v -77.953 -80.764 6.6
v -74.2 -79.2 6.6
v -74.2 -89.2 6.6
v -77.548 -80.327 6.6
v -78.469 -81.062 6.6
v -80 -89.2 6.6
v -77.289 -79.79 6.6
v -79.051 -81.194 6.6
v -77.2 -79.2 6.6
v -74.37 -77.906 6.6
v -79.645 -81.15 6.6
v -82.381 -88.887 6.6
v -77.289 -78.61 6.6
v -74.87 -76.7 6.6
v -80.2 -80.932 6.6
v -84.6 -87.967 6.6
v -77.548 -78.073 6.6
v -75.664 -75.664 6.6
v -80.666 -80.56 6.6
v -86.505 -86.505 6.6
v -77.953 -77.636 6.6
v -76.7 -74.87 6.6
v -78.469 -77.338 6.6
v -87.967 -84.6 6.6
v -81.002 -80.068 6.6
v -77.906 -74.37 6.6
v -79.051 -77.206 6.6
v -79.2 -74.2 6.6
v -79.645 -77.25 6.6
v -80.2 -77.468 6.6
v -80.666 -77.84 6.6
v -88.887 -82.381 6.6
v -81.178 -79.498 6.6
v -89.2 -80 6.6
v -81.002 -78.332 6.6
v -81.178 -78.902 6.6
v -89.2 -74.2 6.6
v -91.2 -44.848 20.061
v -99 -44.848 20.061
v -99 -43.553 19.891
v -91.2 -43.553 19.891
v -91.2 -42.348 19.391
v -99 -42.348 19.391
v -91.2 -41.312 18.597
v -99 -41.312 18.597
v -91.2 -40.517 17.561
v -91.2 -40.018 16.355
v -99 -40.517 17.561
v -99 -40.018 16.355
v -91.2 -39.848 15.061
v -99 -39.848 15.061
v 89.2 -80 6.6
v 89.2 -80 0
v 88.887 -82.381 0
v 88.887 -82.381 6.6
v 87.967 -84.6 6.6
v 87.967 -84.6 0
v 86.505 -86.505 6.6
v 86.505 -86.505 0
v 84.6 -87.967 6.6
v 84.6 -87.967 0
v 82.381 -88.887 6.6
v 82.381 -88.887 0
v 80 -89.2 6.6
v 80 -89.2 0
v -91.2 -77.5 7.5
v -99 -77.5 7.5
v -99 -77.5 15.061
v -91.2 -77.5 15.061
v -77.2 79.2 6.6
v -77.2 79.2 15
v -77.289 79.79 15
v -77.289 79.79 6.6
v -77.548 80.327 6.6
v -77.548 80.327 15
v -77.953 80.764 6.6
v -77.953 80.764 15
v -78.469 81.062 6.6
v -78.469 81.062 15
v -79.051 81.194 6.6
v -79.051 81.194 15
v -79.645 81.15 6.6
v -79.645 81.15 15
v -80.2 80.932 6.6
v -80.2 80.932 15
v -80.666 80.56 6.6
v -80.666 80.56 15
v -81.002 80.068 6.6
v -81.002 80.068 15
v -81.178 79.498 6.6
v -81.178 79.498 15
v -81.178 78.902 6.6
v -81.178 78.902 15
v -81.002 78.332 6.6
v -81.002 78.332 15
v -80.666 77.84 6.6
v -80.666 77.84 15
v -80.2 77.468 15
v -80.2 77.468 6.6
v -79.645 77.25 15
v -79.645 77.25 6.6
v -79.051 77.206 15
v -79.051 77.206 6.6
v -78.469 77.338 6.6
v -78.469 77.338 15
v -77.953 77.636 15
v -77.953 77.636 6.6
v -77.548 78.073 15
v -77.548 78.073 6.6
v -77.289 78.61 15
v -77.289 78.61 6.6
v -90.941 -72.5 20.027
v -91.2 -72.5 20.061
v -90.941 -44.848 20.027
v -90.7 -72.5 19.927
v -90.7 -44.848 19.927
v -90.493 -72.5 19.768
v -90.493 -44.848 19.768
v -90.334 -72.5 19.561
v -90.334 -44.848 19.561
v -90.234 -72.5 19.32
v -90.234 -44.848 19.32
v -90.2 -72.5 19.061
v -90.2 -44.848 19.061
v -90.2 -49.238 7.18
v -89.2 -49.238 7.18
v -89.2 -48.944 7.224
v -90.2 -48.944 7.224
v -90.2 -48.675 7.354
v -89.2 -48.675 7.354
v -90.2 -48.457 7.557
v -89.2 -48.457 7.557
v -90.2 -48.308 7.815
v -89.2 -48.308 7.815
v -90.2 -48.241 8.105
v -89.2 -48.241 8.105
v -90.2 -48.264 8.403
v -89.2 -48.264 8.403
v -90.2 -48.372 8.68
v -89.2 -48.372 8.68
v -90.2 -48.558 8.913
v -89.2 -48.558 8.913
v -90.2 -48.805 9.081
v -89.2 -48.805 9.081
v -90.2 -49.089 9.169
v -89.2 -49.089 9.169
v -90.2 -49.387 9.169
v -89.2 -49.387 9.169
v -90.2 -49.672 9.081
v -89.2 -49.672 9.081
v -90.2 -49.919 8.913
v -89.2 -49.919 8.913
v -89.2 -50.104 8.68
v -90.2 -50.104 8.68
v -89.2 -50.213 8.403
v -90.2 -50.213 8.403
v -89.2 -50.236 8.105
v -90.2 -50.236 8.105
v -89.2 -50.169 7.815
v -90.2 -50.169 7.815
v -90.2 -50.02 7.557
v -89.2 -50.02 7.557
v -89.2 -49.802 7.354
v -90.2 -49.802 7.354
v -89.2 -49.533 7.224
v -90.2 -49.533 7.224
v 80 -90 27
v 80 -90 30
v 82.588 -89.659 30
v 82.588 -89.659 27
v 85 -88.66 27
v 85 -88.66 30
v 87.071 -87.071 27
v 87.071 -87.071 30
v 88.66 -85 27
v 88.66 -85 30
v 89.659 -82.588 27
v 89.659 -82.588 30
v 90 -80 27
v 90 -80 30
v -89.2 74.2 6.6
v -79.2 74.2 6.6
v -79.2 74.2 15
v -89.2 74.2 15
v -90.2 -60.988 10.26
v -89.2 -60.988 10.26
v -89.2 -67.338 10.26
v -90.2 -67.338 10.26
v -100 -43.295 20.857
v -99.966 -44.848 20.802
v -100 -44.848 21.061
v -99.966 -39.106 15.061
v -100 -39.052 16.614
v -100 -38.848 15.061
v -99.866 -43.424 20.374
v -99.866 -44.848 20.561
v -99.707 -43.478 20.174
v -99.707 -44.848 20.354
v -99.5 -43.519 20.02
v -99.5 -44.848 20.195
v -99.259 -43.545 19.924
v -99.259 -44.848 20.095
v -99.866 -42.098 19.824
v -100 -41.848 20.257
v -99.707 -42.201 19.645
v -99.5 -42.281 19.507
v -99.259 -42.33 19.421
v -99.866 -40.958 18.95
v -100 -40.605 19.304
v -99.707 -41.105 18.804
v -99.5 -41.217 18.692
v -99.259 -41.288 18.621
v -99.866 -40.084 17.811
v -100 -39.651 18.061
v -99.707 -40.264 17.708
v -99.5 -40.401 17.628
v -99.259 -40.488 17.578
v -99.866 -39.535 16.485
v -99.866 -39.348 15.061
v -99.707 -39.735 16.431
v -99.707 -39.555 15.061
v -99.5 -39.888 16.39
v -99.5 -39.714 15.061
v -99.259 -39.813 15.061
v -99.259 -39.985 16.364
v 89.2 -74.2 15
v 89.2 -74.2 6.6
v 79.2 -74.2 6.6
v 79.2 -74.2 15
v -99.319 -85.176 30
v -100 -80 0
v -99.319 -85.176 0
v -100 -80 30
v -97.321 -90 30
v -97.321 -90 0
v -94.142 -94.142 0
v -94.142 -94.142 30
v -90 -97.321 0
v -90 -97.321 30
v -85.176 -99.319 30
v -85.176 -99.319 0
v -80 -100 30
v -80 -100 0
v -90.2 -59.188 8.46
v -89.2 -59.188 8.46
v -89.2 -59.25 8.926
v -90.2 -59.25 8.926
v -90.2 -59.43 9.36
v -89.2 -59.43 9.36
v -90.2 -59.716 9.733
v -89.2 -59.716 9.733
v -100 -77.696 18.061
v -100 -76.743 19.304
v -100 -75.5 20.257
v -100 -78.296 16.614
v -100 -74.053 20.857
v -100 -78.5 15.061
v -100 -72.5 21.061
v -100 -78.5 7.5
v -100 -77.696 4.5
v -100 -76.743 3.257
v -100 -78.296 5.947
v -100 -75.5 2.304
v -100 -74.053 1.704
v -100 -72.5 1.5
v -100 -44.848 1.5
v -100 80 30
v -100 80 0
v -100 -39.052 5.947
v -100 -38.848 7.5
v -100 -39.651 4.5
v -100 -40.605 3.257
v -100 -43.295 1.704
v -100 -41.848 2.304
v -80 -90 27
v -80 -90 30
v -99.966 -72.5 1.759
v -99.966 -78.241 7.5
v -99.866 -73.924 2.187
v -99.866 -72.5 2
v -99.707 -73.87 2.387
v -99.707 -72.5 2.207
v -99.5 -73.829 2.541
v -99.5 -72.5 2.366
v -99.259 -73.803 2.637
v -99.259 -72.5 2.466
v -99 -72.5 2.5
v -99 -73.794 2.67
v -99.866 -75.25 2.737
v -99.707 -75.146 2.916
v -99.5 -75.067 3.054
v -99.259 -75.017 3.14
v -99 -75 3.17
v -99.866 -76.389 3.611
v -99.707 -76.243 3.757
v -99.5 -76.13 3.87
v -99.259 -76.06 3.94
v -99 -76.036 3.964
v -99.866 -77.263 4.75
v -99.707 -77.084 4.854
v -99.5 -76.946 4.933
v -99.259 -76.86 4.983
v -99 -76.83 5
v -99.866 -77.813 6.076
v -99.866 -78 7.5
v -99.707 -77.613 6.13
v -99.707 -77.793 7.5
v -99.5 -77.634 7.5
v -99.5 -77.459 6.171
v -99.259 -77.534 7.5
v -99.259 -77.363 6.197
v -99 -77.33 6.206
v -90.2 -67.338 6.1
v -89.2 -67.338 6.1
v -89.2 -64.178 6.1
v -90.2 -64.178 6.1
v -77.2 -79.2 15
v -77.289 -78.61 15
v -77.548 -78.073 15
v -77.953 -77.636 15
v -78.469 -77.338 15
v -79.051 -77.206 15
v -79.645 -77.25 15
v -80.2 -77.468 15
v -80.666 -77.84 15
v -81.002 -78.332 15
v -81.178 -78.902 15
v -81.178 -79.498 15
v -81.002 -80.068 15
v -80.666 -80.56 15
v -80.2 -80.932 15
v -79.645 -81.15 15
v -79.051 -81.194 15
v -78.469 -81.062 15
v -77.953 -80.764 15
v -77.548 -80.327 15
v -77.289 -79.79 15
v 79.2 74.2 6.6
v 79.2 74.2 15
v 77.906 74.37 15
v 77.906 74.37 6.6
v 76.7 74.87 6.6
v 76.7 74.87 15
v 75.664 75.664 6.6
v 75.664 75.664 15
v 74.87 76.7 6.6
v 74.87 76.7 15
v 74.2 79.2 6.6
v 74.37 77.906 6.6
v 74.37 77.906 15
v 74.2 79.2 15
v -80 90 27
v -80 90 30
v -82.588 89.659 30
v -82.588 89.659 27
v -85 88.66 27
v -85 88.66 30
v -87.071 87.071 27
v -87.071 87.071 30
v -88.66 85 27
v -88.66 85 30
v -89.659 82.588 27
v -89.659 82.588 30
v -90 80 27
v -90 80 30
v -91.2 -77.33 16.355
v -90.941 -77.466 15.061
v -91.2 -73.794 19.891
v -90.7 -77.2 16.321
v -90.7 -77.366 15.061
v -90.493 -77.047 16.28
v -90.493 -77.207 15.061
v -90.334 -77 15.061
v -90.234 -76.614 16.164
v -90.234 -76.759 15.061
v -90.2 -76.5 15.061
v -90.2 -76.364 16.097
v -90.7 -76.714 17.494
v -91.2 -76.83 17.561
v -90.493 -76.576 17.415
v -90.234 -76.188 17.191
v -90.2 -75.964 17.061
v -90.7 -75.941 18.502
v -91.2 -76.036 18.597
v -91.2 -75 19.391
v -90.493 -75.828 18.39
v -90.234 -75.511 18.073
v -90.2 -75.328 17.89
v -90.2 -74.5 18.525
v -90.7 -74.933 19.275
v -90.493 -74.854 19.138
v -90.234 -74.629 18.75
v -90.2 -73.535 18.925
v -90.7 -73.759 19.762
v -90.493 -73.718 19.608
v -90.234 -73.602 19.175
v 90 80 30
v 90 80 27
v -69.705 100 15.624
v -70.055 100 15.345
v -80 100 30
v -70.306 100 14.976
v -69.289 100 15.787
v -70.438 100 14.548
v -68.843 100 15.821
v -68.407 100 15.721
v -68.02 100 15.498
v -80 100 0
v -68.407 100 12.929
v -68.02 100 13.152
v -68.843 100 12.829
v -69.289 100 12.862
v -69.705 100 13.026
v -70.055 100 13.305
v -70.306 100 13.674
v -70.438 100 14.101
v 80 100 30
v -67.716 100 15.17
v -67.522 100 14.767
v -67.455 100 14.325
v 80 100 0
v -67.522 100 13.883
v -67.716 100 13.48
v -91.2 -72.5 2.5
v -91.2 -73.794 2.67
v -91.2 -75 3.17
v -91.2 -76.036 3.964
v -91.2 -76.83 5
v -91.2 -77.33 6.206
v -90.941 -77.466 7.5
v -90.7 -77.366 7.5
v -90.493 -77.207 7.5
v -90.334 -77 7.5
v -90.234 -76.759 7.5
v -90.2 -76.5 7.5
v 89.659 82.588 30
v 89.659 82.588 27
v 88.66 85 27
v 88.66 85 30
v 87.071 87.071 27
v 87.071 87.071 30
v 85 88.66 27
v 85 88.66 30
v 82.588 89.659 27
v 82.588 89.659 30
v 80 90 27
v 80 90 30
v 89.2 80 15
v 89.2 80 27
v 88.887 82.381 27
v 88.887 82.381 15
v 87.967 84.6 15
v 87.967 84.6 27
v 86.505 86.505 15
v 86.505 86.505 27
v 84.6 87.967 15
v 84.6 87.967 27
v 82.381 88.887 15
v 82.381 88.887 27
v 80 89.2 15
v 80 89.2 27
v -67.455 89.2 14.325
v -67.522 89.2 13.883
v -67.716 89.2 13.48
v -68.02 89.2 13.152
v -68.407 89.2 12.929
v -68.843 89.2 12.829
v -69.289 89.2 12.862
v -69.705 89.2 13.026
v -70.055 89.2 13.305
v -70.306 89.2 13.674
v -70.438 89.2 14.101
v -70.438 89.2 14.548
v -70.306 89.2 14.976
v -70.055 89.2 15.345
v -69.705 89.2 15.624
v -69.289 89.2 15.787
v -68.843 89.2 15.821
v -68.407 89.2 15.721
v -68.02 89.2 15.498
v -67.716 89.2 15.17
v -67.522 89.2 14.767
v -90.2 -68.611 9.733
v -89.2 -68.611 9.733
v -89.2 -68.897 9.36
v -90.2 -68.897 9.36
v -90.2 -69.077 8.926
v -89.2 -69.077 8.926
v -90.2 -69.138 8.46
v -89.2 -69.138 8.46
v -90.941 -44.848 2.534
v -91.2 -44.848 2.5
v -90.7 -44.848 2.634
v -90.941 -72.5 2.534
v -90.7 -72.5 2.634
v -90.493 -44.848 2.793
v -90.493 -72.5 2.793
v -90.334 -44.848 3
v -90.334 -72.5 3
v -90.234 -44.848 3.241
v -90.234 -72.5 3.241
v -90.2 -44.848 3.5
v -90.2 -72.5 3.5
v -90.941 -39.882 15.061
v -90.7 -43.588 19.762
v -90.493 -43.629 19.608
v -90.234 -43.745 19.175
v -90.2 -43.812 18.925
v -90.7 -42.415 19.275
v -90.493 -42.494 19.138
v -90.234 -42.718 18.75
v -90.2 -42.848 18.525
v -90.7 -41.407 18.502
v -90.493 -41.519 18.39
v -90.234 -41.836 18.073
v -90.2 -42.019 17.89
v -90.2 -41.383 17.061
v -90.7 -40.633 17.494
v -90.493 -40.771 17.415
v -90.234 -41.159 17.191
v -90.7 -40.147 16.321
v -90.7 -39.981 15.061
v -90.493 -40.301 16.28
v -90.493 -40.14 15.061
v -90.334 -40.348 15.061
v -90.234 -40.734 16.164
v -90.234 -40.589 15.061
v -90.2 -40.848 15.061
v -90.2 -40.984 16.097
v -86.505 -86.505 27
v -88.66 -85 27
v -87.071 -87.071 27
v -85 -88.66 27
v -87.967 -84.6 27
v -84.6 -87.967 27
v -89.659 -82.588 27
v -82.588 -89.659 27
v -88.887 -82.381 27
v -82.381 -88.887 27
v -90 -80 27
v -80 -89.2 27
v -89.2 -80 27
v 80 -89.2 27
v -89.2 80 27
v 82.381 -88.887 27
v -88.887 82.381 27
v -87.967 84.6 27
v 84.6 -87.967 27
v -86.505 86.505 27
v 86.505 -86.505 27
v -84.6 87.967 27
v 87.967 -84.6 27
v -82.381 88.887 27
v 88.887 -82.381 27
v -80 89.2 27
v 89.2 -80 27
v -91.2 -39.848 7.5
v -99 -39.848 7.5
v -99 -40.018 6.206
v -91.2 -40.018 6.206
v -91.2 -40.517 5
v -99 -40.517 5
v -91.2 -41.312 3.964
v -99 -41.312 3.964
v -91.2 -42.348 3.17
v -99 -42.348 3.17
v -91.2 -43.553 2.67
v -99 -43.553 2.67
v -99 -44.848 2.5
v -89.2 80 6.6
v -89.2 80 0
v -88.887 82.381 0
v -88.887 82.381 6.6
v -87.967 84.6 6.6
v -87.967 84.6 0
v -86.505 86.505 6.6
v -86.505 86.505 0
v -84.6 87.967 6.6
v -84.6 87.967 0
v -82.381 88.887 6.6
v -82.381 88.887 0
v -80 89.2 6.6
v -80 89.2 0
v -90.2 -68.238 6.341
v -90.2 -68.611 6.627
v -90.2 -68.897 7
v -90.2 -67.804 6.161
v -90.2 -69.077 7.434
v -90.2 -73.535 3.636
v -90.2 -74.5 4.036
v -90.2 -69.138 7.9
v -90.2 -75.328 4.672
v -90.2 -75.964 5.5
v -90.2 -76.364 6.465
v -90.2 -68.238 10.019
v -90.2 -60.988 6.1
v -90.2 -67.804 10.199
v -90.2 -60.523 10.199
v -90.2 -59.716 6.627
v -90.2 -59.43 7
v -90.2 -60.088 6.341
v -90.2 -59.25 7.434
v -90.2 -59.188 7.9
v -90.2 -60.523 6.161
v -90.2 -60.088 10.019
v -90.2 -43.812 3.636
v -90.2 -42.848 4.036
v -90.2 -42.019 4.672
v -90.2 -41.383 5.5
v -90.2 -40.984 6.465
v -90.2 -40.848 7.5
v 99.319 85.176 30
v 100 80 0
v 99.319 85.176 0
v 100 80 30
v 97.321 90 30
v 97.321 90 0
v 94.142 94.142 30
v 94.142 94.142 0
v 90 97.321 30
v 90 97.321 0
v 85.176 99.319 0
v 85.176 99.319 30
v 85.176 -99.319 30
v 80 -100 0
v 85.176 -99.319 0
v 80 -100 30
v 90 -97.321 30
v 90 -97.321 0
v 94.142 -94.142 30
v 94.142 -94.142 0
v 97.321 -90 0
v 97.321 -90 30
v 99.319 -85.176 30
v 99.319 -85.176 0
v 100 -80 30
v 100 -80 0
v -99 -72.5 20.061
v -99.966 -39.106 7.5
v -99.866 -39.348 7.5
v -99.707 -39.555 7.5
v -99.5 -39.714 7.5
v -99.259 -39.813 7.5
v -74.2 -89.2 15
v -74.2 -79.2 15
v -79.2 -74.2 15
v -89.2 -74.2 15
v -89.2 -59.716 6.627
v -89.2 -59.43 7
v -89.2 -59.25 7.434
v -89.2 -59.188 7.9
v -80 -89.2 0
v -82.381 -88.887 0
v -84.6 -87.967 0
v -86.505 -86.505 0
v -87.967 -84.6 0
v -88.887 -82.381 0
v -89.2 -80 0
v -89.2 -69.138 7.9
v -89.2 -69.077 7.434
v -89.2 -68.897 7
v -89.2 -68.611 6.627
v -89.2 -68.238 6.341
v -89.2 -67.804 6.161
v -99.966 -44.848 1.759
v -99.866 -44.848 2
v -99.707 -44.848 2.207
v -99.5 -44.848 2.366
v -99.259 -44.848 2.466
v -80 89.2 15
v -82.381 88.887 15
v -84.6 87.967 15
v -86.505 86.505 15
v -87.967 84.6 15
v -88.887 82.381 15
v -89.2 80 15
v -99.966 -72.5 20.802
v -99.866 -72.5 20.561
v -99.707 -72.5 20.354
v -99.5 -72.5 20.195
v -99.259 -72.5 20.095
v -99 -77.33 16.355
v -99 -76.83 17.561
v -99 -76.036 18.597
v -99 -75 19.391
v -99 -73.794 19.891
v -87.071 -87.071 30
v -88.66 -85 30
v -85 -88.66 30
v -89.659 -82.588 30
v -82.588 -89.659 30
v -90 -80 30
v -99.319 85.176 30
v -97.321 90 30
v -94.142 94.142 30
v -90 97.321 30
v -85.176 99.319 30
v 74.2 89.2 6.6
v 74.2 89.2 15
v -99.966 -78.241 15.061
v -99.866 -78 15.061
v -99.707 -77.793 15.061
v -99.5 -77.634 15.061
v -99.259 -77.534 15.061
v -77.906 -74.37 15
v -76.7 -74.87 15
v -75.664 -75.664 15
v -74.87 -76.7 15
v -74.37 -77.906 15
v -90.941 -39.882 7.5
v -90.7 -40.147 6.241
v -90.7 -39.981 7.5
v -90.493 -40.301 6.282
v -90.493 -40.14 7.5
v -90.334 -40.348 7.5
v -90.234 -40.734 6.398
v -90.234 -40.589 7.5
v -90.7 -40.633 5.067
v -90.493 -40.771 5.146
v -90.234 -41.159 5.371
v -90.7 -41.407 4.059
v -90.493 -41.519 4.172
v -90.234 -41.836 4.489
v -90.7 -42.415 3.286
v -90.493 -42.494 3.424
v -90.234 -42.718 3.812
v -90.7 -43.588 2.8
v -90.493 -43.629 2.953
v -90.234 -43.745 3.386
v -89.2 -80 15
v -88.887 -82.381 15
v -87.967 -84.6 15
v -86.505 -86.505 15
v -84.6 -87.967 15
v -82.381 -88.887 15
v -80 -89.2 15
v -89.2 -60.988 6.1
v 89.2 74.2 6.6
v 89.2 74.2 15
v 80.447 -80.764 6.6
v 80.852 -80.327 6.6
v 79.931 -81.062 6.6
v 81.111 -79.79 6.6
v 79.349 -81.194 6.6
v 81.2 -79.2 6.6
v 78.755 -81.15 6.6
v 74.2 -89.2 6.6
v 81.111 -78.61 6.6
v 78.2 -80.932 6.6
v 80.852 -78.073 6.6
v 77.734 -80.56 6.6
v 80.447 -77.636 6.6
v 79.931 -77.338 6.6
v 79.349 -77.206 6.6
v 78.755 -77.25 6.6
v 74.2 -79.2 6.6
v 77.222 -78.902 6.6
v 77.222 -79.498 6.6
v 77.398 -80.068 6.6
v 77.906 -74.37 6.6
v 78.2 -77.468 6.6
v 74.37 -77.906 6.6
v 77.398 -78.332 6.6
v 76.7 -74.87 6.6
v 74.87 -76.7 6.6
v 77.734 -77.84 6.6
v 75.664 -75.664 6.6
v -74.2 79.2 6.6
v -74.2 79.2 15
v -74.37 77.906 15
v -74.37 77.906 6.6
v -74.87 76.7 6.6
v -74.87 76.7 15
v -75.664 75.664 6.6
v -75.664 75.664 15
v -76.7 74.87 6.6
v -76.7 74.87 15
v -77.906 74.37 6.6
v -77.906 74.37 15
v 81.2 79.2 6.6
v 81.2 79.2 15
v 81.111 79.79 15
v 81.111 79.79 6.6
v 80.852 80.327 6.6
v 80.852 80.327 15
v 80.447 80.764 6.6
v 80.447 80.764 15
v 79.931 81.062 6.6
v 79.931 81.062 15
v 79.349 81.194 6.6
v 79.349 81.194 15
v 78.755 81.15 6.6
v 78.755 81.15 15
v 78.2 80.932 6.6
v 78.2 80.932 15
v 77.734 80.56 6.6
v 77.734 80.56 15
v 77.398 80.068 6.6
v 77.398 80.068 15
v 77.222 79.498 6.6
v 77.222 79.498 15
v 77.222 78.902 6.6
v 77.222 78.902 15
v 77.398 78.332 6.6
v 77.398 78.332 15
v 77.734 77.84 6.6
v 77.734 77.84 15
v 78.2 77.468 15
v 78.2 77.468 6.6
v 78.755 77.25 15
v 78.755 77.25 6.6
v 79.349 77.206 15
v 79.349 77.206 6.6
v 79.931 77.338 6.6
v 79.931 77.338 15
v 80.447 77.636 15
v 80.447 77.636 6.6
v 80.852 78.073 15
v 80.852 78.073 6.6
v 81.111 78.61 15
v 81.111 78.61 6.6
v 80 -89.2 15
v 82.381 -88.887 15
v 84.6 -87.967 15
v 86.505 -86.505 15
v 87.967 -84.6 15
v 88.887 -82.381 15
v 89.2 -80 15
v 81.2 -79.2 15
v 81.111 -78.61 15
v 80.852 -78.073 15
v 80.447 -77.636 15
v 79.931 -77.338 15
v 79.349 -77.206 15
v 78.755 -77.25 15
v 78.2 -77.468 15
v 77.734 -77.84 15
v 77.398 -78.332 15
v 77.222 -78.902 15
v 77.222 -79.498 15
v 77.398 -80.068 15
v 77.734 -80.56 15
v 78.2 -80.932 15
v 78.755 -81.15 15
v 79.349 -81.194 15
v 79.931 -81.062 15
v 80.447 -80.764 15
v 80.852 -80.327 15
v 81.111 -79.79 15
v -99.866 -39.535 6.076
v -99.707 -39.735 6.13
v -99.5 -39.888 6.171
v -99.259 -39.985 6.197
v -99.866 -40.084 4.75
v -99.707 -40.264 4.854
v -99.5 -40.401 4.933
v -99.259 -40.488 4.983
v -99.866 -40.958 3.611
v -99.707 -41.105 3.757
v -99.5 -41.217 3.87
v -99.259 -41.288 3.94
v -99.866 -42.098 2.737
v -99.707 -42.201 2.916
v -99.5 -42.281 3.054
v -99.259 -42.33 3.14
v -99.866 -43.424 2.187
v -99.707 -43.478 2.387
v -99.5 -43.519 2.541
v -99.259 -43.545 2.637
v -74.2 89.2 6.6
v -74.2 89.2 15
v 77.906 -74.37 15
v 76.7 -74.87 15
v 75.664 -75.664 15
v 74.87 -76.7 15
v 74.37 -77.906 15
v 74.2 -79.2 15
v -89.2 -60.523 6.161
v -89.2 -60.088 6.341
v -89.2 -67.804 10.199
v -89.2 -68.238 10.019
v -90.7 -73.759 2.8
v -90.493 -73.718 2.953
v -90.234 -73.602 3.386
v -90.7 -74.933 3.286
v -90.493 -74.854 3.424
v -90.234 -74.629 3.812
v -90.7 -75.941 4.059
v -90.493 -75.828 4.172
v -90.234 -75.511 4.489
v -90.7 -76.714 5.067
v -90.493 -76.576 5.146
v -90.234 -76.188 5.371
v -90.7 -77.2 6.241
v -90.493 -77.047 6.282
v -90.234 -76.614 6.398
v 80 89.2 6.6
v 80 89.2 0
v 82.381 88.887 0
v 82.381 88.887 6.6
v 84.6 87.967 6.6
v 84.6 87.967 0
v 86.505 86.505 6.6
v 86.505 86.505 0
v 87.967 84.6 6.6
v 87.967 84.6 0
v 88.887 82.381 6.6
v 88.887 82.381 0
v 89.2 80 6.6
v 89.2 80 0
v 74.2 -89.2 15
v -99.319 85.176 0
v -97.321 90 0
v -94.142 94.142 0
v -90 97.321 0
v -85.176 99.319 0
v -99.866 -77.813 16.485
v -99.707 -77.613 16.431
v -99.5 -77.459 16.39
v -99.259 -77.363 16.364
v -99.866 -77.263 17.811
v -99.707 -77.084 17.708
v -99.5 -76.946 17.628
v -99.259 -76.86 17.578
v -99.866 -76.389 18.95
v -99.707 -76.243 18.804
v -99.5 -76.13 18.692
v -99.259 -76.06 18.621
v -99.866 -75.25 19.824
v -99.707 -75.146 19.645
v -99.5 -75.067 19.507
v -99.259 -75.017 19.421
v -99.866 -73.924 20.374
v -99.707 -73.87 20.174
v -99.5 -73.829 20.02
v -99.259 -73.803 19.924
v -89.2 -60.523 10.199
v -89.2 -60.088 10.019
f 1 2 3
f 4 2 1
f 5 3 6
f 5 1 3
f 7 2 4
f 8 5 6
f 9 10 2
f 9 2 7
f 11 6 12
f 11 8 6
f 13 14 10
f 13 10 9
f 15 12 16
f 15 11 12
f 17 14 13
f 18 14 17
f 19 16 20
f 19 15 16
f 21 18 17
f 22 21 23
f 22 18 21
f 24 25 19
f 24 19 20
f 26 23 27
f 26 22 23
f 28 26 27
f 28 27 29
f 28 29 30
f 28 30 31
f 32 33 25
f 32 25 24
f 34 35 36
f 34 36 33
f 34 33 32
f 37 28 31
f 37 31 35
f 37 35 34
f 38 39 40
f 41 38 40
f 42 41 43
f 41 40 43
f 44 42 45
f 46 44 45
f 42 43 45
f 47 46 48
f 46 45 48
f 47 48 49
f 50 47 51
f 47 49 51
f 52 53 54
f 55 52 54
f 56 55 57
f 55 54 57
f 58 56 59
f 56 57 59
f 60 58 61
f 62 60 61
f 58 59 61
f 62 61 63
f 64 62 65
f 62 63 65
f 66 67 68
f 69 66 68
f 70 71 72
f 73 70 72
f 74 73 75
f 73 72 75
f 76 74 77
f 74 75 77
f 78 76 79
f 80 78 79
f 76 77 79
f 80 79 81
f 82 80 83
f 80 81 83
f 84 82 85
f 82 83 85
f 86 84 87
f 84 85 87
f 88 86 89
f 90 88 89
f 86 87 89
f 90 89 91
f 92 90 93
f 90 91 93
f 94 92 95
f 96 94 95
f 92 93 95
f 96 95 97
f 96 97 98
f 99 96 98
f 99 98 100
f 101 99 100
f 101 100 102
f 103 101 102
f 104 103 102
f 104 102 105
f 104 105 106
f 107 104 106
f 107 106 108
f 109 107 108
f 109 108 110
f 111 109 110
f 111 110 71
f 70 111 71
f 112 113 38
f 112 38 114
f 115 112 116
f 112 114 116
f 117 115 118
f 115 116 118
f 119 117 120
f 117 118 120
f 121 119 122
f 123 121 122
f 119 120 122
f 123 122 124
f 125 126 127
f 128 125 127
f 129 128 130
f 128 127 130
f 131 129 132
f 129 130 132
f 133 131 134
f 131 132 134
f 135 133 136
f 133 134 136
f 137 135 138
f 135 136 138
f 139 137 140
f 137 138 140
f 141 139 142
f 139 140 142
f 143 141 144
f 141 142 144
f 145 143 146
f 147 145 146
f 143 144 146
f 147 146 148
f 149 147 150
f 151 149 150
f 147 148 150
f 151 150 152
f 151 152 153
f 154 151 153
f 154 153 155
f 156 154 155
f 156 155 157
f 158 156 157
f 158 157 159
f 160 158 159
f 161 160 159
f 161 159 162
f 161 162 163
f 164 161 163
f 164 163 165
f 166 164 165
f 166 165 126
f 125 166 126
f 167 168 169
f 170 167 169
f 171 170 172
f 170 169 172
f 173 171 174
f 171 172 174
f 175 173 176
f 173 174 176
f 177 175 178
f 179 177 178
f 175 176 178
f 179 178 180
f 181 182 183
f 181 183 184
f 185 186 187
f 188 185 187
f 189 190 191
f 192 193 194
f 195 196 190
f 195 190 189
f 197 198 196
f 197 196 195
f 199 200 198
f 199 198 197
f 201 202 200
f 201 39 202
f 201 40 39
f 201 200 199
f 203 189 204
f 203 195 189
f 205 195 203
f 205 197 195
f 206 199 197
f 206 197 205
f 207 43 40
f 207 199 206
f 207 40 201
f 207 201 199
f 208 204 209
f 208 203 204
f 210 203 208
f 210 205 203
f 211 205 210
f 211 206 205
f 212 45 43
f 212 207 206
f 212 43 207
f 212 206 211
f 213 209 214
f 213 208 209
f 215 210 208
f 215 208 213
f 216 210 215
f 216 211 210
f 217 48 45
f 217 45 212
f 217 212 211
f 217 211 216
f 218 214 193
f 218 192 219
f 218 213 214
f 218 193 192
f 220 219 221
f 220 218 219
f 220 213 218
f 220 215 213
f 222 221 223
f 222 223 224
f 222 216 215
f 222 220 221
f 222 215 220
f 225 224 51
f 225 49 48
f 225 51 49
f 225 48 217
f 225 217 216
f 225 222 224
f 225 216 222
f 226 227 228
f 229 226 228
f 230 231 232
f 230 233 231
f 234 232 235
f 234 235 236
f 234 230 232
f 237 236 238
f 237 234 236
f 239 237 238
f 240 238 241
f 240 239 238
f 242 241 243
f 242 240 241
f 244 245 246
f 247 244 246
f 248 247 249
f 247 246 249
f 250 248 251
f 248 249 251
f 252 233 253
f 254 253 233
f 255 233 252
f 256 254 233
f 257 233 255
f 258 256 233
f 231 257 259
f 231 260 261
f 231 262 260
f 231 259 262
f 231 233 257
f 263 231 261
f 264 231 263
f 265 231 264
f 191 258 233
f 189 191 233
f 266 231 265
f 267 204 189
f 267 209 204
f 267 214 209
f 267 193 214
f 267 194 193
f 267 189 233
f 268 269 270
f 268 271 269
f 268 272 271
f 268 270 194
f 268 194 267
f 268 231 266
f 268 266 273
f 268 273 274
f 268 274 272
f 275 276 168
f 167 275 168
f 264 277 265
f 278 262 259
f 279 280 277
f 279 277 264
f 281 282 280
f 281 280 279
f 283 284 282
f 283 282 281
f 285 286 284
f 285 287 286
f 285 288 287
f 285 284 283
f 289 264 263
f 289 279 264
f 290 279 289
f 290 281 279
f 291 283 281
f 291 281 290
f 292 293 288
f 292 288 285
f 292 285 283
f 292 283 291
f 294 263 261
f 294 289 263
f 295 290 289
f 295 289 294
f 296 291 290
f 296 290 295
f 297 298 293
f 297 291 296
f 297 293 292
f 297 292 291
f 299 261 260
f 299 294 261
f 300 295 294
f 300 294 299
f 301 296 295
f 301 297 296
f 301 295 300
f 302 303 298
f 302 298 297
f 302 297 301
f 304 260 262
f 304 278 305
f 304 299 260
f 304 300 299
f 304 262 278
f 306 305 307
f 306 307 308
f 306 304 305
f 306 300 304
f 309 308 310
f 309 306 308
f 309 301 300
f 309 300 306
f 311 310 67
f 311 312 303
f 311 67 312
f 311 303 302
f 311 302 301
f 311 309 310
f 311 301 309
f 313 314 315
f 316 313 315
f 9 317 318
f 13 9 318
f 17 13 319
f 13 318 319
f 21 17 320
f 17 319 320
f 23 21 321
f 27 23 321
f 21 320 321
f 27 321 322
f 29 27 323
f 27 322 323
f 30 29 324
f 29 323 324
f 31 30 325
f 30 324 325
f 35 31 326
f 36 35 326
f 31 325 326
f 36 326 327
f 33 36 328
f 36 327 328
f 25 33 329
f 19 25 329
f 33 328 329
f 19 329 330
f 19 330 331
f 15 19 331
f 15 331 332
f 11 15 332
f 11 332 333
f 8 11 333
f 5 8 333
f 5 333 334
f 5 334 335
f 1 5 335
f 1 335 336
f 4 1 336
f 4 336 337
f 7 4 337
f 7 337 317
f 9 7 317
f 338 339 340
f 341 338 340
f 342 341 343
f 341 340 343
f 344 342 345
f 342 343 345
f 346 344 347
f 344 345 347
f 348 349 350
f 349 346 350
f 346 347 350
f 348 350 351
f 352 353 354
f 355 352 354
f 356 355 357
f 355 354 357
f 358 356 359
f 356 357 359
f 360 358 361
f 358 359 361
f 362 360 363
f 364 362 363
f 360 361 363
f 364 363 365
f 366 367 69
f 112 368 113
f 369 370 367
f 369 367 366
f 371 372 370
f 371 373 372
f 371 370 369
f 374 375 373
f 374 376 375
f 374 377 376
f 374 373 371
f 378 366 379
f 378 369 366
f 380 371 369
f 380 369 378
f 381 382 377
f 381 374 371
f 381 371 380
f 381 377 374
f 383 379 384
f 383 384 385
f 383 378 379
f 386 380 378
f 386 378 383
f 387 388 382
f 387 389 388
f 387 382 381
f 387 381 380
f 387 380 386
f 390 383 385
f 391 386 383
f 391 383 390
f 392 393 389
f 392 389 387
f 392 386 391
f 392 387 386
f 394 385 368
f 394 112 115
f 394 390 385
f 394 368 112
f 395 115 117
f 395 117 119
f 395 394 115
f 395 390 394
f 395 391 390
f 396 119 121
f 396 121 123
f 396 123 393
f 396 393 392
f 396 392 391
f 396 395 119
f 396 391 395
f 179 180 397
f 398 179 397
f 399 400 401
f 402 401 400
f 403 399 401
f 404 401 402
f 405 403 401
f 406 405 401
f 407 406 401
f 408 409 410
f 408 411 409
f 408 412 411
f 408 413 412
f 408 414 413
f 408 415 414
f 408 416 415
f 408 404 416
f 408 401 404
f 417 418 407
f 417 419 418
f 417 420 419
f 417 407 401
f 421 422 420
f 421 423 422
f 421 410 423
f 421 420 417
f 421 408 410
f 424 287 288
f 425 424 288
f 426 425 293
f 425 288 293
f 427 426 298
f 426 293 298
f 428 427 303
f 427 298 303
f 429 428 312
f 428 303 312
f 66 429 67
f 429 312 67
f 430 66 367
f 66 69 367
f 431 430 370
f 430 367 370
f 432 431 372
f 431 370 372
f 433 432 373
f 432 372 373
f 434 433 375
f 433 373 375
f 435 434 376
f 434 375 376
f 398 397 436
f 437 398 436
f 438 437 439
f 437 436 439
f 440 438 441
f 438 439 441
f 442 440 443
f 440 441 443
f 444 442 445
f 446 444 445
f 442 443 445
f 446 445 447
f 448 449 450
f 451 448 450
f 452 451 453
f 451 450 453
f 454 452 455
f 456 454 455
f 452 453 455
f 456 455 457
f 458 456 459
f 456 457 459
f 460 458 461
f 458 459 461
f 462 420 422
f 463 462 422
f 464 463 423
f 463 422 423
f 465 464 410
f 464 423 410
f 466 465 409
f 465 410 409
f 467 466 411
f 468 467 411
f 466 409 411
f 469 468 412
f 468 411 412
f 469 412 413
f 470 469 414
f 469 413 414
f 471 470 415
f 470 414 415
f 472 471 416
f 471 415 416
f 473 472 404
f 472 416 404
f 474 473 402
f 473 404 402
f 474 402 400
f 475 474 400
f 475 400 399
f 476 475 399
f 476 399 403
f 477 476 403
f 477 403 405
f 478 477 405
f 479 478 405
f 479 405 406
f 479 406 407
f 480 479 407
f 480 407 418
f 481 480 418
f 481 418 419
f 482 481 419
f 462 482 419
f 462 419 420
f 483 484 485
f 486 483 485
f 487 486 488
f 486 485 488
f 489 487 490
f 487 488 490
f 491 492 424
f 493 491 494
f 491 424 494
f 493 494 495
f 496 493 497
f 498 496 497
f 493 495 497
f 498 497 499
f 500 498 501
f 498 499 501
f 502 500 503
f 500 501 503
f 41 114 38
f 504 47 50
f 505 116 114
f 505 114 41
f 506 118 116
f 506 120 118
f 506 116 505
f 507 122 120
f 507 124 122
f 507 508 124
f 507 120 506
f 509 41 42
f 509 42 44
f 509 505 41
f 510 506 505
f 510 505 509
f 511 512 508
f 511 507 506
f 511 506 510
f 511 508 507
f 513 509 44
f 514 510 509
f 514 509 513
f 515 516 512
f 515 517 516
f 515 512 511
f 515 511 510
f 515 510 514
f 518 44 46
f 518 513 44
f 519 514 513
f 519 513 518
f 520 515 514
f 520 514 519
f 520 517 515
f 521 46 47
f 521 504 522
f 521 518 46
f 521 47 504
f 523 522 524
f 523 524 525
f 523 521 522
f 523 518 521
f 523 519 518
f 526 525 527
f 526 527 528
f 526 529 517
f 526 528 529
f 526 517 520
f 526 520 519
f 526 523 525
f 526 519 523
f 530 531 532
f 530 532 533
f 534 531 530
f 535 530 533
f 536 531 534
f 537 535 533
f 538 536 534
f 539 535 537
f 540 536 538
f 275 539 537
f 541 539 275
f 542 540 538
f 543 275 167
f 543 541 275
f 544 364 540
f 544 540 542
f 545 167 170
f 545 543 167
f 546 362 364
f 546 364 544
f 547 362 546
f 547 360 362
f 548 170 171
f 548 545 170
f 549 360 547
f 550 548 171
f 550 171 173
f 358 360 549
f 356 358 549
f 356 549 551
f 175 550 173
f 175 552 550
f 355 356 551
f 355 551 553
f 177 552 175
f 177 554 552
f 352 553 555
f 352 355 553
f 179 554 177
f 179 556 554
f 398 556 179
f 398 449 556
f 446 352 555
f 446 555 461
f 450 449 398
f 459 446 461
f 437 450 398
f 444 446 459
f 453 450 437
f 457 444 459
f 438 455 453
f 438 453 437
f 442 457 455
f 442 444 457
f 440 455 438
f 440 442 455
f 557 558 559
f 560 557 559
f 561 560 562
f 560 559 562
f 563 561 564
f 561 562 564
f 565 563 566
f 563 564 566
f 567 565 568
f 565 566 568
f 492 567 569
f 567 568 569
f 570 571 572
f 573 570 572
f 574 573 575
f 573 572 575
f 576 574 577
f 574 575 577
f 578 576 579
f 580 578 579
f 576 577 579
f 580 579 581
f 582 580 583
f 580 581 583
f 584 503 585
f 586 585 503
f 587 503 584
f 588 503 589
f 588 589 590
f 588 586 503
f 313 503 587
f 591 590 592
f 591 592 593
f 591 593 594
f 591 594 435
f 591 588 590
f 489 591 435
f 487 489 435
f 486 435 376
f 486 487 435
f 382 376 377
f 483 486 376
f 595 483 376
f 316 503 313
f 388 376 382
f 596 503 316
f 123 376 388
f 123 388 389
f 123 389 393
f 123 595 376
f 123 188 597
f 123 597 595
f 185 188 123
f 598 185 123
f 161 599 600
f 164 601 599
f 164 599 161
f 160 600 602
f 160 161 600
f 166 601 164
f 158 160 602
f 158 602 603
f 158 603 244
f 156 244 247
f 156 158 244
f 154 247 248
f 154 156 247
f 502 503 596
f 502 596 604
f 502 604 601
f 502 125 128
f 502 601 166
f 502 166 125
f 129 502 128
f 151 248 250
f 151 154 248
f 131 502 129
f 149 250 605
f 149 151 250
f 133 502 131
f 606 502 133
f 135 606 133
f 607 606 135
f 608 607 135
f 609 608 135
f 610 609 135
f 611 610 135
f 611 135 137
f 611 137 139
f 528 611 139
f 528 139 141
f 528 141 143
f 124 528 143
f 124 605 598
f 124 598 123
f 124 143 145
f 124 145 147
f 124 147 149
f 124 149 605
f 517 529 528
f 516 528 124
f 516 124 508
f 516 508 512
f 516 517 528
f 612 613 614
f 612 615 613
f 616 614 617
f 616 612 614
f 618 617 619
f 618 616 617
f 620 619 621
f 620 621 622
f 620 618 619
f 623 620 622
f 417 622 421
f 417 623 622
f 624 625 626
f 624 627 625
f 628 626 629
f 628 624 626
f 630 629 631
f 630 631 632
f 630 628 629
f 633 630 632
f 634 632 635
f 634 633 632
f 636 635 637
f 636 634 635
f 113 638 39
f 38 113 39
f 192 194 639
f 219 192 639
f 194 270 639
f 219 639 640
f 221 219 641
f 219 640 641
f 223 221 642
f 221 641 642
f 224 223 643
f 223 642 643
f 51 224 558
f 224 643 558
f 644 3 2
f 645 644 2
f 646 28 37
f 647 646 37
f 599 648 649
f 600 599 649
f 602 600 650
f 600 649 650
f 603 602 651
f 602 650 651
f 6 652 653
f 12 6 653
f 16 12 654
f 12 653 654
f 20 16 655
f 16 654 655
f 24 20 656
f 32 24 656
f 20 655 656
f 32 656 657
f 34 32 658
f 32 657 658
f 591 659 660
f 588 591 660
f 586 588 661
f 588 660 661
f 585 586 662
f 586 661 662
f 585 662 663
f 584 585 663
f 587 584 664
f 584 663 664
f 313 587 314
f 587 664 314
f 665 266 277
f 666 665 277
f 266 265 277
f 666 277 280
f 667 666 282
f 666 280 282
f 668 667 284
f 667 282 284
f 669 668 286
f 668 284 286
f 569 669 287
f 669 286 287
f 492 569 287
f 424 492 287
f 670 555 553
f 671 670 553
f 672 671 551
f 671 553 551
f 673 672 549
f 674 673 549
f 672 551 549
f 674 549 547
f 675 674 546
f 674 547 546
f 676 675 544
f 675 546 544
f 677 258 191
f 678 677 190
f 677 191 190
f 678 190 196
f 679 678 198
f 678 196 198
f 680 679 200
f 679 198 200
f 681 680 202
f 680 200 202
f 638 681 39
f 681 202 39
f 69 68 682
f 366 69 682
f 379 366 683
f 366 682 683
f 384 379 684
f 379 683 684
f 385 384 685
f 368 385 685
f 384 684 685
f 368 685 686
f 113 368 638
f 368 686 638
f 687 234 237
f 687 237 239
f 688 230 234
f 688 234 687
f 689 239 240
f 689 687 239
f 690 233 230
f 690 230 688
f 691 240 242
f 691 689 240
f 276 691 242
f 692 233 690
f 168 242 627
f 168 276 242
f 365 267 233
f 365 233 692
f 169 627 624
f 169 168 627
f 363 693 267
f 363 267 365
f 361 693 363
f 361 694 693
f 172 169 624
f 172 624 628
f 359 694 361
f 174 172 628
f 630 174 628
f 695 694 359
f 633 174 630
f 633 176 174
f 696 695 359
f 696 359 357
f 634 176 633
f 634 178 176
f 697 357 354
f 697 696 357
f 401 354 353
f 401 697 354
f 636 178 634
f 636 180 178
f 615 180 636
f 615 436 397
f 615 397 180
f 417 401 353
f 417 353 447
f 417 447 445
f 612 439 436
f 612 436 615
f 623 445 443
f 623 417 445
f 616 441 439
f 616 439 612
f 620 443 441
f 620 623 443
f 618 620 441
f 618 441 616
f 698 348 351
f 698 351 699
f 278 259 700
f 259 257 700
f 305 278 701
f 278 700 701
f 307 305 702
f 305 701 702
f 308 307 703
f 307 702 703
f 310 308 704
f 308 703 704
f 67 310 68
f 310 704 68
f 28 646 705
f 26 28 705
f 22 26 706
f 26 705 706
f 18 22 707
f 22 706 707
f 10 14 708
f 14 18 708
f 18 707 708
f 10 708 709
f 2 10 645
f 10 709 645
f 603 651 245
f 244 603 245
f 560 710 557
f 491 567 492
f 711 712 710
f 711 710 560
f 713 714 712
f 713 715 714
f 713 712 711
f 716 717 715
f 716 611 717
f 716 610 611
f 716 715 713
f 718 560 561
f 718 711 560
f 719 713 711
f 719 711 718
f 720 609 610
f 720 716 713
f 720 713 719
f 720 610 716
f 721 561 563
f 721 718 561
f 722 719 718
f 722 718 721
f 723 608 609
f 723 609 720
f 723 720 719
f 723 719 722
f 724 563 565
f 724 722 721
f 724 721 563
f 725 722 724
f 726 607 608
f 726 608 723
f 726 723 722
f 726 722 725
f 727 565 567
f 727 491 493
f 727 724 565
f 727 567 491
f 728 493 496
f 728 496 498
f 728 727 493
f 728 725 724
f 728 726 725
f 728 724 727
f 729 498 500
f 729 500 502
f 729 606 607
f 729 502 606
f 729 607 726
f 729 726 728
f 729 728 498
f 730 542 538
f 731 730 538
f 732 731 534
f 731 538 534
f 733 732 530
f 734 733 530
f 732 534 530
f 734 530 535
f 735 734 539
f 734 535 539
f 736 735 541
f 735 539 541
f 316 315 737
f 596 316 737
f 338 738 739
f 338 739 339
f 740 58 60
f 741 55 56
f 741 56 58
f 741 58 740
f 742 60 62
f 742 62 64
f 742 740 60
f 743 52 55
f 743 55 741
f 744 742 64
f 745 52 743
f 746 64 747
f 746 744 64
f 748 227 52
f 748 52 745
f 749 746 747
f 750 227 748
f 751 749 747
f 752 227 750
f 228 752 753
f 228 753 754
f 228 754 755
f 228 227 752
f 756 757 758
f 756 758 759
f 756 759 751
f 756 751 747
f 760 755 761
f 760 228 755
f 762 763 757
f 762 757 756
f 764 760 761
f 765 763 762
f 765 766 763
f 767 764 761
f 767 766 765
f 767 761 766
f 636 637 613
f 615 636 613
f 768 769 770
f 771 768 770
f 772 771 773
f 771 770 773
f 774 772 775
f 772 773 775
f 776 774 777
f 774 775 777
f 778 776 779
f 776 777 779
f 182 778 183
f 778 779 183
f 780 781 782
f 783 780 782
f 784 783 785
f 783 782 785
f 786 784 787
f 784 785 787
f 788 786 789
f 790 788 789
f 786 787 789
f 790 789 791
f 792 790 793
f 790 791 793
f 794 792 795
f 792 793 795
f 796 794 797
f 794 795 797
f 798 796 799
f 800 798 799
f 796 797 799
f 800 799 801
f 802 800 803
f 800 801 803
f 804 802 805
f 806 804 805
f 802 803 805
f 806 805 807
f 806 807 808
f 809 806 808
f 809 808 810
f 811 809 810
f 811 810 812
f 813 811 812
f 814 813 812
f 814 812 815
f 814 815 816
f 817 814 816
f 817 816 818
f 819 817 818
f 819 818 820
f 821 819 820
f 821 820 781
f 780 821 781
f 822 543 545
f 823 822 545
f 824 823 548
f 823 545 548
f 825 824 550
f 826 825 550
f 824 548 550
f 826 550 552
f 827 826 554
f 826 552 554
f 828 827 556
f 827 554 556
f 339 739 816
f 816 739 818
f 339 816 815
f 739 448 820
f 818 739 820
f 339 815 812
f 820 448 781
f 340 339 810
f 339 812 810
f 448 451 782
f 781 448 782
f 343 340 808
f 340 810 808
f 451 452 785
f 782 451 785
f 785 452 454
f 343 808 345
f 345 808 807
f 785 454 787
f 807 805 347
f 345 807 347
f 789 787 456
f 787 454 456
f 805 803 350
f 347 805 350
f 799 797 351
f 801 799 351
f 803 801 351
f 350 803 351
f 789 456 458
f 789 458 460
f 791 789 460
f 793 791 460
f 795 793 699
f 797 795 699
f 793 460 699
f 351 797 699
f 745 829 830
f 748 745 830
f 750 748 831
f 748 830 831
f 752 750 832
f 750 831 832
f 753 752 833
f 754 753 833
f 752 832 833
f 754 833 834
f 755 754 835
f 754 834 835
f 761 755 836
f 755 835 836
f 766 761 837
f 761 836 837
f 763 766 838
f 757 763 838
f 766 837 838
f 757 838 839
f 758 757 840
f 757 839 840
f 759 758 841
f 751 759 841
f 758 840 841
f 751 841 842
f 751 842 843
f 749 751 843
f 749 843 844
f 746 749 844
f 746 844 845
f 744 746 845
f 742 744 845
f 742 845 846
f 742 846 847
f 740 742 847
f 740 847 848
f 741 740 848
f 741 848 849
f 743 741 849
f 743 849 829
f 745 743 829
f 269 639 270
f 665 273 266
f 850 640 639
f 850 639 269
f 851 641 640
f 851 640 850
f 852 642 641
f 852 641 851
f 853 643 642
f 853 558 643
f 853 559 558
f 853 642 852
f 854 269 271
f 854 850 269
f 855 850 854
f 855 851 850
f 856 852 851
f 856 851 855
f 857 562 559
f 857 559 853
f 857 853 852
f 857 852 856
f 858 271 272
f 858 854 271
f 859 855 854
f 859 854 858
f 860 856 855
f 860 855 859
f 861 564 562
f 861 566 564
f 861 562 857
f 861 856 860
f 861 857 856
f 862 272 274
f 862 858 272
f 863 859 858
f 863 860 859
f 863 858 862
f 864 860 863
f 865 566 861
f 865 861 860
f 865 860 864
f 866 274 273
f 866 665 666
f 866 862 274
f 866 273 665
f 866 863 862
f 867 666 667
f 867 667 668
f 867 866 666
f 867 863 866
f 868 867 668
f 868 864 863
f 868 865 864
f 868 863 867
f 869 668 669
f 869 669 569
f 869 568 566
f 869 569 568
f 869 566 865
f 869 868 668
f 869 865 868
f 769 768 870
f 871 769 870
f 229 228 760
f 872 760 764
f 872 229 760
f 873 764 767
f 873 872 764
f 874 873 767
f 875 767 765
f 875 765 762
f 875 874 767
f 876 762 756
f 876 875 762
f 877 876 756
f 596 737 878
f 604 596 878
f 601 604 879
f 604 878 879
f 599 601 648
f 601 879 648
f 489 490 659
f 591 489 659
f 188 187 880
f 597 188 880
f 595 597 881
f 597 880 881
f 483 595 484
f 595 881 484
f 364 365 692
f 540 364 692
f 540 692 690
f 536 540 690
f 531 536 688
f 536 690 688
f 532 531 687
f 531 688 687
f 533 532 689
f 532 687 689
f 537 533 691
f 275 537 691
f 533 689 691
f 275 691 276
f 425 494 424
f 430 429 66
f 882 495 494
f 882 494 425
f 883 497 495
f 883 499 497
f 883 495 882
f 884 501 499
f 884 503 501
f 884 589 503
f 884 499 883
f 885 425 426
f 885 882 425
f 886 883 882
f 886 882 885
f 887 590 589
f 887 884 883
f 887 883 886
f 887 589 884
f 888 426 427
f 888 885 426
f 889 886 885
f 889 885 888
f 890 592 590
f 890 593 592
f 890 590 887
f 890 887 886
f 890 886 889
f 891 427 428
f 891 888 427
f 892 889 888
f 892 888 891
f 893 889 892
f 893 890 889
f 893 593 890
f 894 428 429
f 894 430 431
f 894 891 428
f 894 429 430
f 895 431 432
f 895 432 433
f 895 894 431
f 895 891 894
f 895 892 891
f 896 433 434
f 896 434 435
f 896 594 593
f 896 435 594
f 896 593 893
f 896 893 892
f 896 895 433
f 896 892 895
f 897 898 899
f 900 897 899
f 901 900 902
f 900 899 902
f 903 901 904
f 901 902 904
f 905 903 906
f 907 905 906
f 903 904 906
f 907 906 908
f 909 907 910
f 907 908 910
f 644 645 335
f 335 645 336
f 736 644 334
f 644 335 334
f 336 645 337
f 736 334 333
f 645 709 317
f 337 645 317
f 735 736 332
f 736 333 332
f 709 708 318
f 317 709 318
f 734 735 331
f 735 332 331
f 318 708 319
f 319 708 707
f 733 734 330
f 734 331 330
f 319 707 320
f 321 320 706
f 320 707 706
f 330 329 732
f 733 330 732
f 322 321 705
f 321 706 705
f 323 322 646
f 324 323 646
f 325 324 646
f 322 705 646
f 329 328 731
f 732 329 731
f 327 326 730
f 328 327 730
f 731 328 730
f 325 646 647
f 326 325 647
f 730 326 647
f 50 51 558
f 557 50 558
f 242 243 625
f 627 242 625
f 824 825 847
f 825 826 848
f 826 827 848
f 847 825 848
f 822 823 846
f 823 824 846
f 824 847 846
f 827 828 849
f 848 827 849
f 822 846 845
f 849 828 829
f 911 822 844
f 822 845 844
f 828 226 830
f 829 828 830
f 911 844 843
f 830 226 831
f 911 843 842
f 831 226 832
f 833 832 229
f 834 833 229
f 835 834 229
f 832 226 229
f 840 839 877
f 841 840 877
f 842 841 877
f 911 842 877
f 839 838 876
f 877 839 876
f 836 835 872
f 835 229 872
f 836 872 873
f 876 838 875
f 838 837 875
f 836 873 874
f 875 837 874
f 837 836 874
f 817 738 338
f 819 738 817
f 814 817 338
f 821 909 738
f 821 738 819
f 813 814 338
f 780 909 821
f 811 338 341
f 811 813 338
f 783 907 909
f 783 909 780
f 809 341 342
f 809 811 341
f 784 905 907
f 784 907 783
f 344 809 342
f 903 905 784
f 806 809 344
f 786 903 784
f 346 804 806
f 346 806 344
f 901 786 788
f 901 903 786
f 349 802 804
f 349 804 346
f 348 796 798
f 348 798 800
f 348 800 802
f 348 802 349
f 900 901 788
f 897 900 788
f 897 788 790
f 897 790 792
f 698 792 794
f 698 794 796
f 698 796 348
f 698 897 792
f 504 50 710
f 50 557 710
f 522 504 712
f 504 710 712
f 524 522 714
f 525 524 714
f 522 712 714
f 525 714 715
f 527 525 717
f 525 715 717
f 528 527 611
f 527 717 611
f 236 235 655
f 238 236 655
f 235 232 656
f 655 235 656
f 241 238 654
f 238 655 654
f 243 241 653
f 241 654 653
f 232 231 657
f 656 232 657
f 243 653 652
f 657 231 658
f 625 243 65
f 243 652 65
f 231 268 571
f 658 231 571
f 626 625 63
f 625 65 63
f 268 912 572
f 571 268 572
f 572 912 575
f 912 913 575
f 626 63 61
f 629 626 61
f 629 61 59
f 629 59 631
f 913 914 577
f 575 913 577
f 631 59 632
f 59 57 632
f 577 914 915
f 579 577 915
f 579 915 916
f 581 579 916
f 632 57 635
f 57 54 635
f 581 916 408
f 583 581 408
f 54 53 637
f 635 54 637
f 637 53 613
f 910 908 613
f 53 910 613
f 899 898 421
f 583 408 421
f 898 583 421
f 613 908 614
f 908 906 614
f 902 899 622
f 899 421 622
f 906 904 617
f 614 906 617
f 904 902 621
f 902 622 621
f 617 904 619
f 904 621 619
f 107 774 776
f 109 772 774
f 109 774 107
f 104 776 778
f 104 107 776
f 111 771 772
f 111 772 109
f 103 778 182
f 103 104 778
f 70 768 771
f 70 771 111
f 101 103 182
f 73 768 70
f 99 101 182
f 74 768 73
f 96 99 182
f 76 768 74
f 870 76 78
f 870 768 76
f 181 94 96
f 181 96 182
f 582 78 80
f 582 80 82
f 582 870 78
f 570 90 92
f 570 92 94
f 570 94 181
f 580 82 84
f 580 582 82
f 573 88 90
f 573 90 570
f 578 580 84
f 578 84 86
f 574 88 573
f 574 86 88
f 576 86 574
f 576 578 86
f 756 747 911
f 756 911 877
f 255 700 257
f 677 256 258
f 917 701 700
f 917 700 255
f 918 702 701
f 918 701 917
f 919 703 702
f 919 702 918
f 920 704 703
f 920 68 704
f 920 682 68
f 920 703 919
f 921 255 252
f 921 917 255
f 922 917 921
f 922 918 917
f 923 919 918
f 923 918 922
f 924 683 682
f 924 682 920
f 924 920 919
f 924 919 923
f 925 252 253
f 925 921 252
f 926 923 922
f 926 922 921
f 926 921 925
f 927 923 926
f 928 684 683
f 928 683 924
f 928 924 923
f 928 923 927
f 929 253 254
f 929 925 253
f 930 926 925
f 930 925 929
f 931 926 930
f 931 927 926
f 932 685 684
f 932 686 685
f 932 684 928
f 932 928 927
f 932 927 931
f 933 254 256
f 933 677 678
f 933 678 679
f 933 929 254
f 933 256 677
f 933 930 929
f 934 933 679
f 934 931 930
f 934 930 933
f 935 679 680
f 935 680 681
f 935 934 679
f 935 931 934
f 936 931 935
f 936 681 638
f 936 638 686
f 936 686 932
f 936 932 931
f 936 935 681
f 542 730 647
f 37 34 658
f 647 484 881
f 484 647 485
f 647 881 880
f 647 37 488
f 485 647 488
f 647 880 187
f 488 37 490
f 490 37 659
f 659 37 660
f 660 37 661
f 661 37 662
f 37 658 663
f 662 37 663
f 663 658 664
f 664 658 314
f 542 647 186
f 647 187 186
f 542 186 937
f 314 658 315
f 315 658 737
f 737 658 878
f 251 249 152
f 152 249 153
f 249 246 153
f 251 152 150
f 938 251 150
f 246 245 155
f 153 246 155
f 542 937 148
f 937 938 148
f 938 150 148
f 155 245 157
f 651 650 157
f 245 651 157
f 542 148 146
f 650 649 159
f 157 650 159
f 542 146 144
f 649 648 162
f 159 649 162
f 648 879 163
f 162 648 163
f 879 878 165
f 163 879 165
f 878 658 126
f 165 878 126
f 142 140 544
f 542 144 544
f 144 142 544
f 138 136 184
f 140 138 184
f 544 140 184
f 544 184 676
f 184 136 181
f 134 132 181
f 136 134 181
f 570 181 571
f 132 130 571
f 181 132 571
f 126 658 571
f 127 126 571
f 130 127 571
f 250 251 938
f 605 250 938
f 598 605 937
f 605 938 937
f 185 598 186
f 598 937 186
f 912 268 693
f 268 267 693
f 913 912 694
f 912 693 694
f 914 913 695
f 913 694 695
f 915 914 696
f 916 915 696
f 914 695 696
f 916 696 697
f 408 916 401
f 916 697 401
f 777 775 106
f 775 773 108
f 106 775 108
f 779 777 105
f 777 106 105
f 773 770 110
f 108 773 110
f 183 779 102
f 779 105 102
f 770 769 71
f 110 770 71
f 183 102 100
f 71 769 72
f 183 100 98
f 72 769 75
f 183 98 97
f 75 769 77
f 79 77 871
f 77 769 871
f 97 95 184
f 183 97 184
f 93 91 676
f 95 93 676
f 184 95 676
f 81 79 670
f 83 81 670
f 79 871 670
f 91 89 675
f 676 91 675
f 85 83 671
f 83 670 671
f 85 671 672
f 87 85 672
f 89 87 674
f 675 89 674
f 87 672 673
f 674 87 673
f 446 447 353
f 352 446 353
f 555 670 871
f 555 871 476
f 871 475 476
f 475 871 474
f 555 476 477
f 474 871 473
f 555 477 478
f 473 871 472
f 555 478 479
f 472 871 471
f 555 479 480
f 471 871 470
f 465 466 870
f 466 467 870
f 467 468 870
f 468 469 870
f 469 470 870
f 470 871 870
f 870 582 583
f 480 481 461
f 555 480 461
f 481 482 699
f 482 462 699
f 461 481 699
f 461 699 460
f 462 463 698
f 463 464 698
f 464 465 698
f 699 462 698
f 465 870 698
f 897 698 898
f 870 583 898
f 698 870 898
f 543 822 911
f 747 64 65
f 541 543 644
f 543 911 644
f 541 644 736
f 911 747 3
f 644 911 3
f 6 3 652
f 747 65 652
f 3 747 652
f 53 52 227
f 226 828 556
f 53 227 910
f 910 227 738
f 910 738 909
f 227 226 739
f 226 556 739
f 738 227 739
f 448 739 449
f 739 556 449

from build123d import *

# Parameters (mm, degrees)
SKETCH2_W                = 200
SKETCH2_H                = 200
BOSS_EXTRUDE1_DEPTH      = 30
FILLET1_R                = 20
CUT_EXTRUDE1_DEPTH       = 3
CUT_EXTRUDE2_DEPTH       = 28
SKETCH6_W                = 15
SKETCH6_H                = 15
BOSS_EXTRUDE4_DEPTH      = 15
FILLET2_R                = 5
F_4_0_4_DIAMETER_HOLE1_D = 4
CUT_EXTRUDE3_DEPTH       = 6.6
CUT_EXTRUDE4_REACH       = 202
SKETCH11_R               = 1.5
SKETCH15_R               = 1
CUT_EXTRUDE5_DEPTH       = 11.8
CUT_EXTRUDE7_DEPTH       = 9.8
FILLET3_R                = 1


with BuildPart() as part:
    # Sketch2 → Boss-Extrude1 (new body)
    with BuildSketch(Plane.XY):
        Rectangle(SKETCH2_W, SKETCH2_H)
    extrude(amount=BOSS_EXTRUDE1_DEPTH)

    # Fillet1
    fillet1_edges = [part.edges().sort_by_distance(p)[0] for p in [
        (100, -100, 15),
        (-100, -100, 15),
        (-100, 100, 15),
        (100, 100, 15),
    ]]
    fillet(fillet1_edges, radius=FILLET1_R)

    # Sketch3 → Cut-Extrude1 (cut)
    with BuildSketch(Plane.XY.offset(30)):
        with BuildLine():
            Line((-90, 80), (-90, -80))
            ThreePointArc((-90, -80), (-87.071067812, -87.071067812), (-80, -90))
            Line((-80, -90), (80, -90))
            ThreePointArc((80, -90), (87.071067812, -87.071067812), (90, -80))
            Line((90, -80), (90, 80))
            ThreePointArc((90, 80), (87.071067812, 87.071067812), (80, 90))
            Line((80, 90), (-80, 90))
            ThreePointArc((-80, 90), (-87.071067812, 87.071067812), (-90, 80))
        make_face()
    extrude(amount=-CUT_EXTRUDE1_DEPTH, mode=Mode.SUBTRACT)

    # Sketch4 → Cut-Extrude2 (cut, through all)
    with BuildSketch(Plane.XY.offset(27)):
        with BuildLine():
            Line((-89.2, 80), (-89.2, -80))
            ThreePointArc((-89.2, -80), (-86.505382387, -86.505382387), (-80, -89.2))
            Line((-80, -89.2), (80, -89.2))
            ThreePointArc((80, -89.2), (86.505382387, -86.505382387), (89.2, -80))
            Line((89.2, -80), (89.2, 80))
            ThreePointArc((89.2, 80), (86.505382387, 86.505382387), (80, 89.2))
            Line((80, 89.2), (-80, 89.2))
            ThreePointArc((-80, 89.2), (-86.505382387, 86.505382387), (-89.2, 80))
        make_face()
    extrude(amount=-CUT_EXTRUDE2_DEPTH, mode=Mode.SUBTRACT)

    # Sketch6 → Boss-Extrude4 (add)
    with BuildSketch(Plane(origin=(0, 0, 0), x_dir=(-1, 0, 0), z_dir=(0, 0, -1))):
        with Locations((-81.7, -81.7)):
            Rectangle(SKETCH6_W, SKETCH6_H)
        with Locations((-81.7, 81.7)):
            Rectangle(SKETCH6_W, SKETCH6_H)
        with Locations((81.7, 81.7)):
            Rectangle(SKETCH6_W, SKETCH6_H)
        with Locations((81.7, -81.7)):
            Rectangle(SKETCH6_W, SKETCH6_H)
    extrude(amount=-BOSS_EXTRUDE4_DEPTH)

    # Fillet2
    fillet2_edges = [part.edges().sort_by_distance(p)[0] for p in [
        (74.2, 74.2, 7.5),
        (-74.2, 74.2, 7.5),
        (-74.2, -74.2, 7.5),
        (74.2, -74.2, 7.5),
    ]]
    fillet(fillet2_edges, radius=FILLET2_R)

    # Ø4.0 (4) Diameter Hole1 (through all)
    with Locations(Plane(origin=(0, 0, 0), x_dir=(-1, 0, 0), z_dir=(0, 0, -1))):
        with Locations((-79.2, 79.2), (79.2, 79.2), (-79.2, -79.2), (79.2, -79.2)):
            Hole(F_4_0_4_DIAMETER_HOLE1_D / 2)

    # Sketch10 → Cut-Extrude3 (cut)
    with BuildSketch(Plane(origin=(0, 0, 0), x_dir=(-1, 0, 0), z_dir=(0, 0, -1))):
        with BuildLine():
            Line((89.2, -80), (89.2, 80))
            ThreePointArc((89.2, 80), (86.505382387, 86.505382387), (80, 89.2))
            Line((80, 89.2), (-80, 89.2))
            ThreePointArc((-80, 89.2), (-86.505382387, 86.505382387), (-89.2, 80))
            Line((-89.2, 80), (-89.2, -80))
            ThreePointArc((-89.2, -80), (-86.505382387, -86.505382387), (-80, -89.2))
            Line((-80, -89.2), (80, -89.2))
            ThreePointArc((80, -89.2), (86.505382387, -86.505382387), (89.2, -80))
        make_face()
    extrude(amount=-CUT_EXTRUDE3_DEPTH, mode=Mode.SUBTRACT)

    # Sketch11 → Cut-Extrude4 (cut, up to next)
    with BuildSketch(Plane(origin=(0, 100, 0), x_dir=(1, 0, 0), z_dir=(0, 1, 0)), mode=Mode.PRIVATE) as cut_extrude4_sk1:
        with Locations((-68.95500318, -14.324851484)):
            Circle(SKETCH11_R)
    cut_extrude4_tool1 = extrude(cut_extrude4_sk1.sketch, amount=-CUT_EXTRUDE4_REACH, mode=Mode.PRIVATE) & part.part
    add(cut_extrude4_tool1.solids().sort_by_distance((-68.955003, 100, 14.324851))[0], mode=Mode.SUBTRACT)

    # Sketch15 → Cut-Extrude5 (cut, through all)
    with BuildSketch(Plane(origin=(-89.2, 0, 0), x_dir=(0, 0, -1), z_dir=(1, 0, 0))):
        with Locations((-8.179999988, -49.23845191)):
            Circle(SKETCH15_R)
        with BuildLine():
            Line((-6.1, -64.178451904), (-6.1, -64.148451912))
            Line((-6.1, -64.148451912), (-6.1, -60.988451904))
            ThreePointArc((-6.1, -60.988451904), (-6.237016841, -60.299621726), (-6.627207794, -59.715659698))
            ThreePointArc((-6.627207794, -59.715659698), (-7.211170067, -59.325468644), (-7.90000053, -59.188451904))
            Line((-7.90000053, -59.188451904), (-8.46, -59.188451904))
            ThreePointArc((-8.46, -59.188451904), (-9.148830178, -59.325468746), (-9.732792206, -59.715659698))
            ThreePointArc((-9.732792206, -59.715659698), (-10.122983159, -60.299621726), (-10.26, -60.988451904))
            Line((-10.26, -60.988451904), (-10.26, -67.338451904))
            ThreePointArc((-10.26, -67.338451904), (-10.122983159, -68.027282082), (-9.732792205, -68.611244109))
            ThreePointArc((-9.732792205, -68.611244109), (-9.148830178, -69.001435061), (-8.46, -69.138451901))
            Line((-8.46, -69.138451901), (-7.900000051, -69.138451901))
            ThreePointArc((-7.900000051, -69.138451901), (-7.211169847, -69.001435069), (-6.627207798, -68.611244107))
            ThreePointArc((-6.627207798, -68.611244107), (-6.237016846, -68.02728208), (-6.100000002, -67.338451904))
            Line((-6.100000002, -67.338451904), (-6.1, -64.178451904))
        make_face()
    extrude(amount=-CUT_EXTRUDE5_DEPTH, mode=Mode.SUBTRACT)

    # Sketch17 → Cut-Extrude7 (cut)
    with BuildSketch(Plane.ZY.offset(100)):
        with BuildLine():
            Line((15.061316978, -39.847521487), (7.5, -39.847521487))
            ThreePointArc((7.5, -39.847521487), (3.964466094, -41.311987581), (2.5, -44.847521487))
            Line((2.5, -44.847521487), (2.5, -72.5))
            ThreePointArc((2.5, -72.5), (3.964466094, -76.035533906), (7.5, -77.5))
            Line((7.5, -77.5), (15.061316978, -77.5))
            ThreePointArc((15.061316978, -77.5), (18.596850884, -76.035533906), (20.061316978, -72.5))
            Line((20.061316978, -72.5), (20.061316978, -44.847521487))
            ThreePointArc((20.061316978, -44.847521487), (18.596850884, -41.311987581), (15.061316978, -39.847521487))
        make_face()
    extrude(amount=-CUT_EXTRUDE7_DEPTH, mode=Mode.SUBTRACT)

    # Fillet3
    fillet3_edges = [part.edges().sort_by_distance(p)[0] for p in [
        (-100, -41.311987581, 3.964466094),
        (-100, -58.673760744, 2.5),
        (-100, -76.035533906, 3.964466094),
        (-100, -77.5, 11.280658489),
        (-100, -76.035533906, 18.596850884),
        (-100, -58.673760744, 20.061316978),
        (-100, -41.311987581, 18.596850884),
        (-100, -39.847521487, 11.280658489),
        (-90.2, -41.311987581, 3.964466094),
        (-90.2, -39.847521487, 11.280658489),
        (-90.2, -41.311987581, 18.596850884),
        (-90.2, -58.673760744, 20.061316978),
        (-90.2, -76.035533906, 18.596850884),
        (-90.2, -77.5, 11.280658489),
        (-90.2, -76.035533906, 3.964466094),
        (-90.2, -58.673760744, 2.5),
    ]]
    fillet(fillet3_edges, radius=FILLET3_R)


solid = part.part
